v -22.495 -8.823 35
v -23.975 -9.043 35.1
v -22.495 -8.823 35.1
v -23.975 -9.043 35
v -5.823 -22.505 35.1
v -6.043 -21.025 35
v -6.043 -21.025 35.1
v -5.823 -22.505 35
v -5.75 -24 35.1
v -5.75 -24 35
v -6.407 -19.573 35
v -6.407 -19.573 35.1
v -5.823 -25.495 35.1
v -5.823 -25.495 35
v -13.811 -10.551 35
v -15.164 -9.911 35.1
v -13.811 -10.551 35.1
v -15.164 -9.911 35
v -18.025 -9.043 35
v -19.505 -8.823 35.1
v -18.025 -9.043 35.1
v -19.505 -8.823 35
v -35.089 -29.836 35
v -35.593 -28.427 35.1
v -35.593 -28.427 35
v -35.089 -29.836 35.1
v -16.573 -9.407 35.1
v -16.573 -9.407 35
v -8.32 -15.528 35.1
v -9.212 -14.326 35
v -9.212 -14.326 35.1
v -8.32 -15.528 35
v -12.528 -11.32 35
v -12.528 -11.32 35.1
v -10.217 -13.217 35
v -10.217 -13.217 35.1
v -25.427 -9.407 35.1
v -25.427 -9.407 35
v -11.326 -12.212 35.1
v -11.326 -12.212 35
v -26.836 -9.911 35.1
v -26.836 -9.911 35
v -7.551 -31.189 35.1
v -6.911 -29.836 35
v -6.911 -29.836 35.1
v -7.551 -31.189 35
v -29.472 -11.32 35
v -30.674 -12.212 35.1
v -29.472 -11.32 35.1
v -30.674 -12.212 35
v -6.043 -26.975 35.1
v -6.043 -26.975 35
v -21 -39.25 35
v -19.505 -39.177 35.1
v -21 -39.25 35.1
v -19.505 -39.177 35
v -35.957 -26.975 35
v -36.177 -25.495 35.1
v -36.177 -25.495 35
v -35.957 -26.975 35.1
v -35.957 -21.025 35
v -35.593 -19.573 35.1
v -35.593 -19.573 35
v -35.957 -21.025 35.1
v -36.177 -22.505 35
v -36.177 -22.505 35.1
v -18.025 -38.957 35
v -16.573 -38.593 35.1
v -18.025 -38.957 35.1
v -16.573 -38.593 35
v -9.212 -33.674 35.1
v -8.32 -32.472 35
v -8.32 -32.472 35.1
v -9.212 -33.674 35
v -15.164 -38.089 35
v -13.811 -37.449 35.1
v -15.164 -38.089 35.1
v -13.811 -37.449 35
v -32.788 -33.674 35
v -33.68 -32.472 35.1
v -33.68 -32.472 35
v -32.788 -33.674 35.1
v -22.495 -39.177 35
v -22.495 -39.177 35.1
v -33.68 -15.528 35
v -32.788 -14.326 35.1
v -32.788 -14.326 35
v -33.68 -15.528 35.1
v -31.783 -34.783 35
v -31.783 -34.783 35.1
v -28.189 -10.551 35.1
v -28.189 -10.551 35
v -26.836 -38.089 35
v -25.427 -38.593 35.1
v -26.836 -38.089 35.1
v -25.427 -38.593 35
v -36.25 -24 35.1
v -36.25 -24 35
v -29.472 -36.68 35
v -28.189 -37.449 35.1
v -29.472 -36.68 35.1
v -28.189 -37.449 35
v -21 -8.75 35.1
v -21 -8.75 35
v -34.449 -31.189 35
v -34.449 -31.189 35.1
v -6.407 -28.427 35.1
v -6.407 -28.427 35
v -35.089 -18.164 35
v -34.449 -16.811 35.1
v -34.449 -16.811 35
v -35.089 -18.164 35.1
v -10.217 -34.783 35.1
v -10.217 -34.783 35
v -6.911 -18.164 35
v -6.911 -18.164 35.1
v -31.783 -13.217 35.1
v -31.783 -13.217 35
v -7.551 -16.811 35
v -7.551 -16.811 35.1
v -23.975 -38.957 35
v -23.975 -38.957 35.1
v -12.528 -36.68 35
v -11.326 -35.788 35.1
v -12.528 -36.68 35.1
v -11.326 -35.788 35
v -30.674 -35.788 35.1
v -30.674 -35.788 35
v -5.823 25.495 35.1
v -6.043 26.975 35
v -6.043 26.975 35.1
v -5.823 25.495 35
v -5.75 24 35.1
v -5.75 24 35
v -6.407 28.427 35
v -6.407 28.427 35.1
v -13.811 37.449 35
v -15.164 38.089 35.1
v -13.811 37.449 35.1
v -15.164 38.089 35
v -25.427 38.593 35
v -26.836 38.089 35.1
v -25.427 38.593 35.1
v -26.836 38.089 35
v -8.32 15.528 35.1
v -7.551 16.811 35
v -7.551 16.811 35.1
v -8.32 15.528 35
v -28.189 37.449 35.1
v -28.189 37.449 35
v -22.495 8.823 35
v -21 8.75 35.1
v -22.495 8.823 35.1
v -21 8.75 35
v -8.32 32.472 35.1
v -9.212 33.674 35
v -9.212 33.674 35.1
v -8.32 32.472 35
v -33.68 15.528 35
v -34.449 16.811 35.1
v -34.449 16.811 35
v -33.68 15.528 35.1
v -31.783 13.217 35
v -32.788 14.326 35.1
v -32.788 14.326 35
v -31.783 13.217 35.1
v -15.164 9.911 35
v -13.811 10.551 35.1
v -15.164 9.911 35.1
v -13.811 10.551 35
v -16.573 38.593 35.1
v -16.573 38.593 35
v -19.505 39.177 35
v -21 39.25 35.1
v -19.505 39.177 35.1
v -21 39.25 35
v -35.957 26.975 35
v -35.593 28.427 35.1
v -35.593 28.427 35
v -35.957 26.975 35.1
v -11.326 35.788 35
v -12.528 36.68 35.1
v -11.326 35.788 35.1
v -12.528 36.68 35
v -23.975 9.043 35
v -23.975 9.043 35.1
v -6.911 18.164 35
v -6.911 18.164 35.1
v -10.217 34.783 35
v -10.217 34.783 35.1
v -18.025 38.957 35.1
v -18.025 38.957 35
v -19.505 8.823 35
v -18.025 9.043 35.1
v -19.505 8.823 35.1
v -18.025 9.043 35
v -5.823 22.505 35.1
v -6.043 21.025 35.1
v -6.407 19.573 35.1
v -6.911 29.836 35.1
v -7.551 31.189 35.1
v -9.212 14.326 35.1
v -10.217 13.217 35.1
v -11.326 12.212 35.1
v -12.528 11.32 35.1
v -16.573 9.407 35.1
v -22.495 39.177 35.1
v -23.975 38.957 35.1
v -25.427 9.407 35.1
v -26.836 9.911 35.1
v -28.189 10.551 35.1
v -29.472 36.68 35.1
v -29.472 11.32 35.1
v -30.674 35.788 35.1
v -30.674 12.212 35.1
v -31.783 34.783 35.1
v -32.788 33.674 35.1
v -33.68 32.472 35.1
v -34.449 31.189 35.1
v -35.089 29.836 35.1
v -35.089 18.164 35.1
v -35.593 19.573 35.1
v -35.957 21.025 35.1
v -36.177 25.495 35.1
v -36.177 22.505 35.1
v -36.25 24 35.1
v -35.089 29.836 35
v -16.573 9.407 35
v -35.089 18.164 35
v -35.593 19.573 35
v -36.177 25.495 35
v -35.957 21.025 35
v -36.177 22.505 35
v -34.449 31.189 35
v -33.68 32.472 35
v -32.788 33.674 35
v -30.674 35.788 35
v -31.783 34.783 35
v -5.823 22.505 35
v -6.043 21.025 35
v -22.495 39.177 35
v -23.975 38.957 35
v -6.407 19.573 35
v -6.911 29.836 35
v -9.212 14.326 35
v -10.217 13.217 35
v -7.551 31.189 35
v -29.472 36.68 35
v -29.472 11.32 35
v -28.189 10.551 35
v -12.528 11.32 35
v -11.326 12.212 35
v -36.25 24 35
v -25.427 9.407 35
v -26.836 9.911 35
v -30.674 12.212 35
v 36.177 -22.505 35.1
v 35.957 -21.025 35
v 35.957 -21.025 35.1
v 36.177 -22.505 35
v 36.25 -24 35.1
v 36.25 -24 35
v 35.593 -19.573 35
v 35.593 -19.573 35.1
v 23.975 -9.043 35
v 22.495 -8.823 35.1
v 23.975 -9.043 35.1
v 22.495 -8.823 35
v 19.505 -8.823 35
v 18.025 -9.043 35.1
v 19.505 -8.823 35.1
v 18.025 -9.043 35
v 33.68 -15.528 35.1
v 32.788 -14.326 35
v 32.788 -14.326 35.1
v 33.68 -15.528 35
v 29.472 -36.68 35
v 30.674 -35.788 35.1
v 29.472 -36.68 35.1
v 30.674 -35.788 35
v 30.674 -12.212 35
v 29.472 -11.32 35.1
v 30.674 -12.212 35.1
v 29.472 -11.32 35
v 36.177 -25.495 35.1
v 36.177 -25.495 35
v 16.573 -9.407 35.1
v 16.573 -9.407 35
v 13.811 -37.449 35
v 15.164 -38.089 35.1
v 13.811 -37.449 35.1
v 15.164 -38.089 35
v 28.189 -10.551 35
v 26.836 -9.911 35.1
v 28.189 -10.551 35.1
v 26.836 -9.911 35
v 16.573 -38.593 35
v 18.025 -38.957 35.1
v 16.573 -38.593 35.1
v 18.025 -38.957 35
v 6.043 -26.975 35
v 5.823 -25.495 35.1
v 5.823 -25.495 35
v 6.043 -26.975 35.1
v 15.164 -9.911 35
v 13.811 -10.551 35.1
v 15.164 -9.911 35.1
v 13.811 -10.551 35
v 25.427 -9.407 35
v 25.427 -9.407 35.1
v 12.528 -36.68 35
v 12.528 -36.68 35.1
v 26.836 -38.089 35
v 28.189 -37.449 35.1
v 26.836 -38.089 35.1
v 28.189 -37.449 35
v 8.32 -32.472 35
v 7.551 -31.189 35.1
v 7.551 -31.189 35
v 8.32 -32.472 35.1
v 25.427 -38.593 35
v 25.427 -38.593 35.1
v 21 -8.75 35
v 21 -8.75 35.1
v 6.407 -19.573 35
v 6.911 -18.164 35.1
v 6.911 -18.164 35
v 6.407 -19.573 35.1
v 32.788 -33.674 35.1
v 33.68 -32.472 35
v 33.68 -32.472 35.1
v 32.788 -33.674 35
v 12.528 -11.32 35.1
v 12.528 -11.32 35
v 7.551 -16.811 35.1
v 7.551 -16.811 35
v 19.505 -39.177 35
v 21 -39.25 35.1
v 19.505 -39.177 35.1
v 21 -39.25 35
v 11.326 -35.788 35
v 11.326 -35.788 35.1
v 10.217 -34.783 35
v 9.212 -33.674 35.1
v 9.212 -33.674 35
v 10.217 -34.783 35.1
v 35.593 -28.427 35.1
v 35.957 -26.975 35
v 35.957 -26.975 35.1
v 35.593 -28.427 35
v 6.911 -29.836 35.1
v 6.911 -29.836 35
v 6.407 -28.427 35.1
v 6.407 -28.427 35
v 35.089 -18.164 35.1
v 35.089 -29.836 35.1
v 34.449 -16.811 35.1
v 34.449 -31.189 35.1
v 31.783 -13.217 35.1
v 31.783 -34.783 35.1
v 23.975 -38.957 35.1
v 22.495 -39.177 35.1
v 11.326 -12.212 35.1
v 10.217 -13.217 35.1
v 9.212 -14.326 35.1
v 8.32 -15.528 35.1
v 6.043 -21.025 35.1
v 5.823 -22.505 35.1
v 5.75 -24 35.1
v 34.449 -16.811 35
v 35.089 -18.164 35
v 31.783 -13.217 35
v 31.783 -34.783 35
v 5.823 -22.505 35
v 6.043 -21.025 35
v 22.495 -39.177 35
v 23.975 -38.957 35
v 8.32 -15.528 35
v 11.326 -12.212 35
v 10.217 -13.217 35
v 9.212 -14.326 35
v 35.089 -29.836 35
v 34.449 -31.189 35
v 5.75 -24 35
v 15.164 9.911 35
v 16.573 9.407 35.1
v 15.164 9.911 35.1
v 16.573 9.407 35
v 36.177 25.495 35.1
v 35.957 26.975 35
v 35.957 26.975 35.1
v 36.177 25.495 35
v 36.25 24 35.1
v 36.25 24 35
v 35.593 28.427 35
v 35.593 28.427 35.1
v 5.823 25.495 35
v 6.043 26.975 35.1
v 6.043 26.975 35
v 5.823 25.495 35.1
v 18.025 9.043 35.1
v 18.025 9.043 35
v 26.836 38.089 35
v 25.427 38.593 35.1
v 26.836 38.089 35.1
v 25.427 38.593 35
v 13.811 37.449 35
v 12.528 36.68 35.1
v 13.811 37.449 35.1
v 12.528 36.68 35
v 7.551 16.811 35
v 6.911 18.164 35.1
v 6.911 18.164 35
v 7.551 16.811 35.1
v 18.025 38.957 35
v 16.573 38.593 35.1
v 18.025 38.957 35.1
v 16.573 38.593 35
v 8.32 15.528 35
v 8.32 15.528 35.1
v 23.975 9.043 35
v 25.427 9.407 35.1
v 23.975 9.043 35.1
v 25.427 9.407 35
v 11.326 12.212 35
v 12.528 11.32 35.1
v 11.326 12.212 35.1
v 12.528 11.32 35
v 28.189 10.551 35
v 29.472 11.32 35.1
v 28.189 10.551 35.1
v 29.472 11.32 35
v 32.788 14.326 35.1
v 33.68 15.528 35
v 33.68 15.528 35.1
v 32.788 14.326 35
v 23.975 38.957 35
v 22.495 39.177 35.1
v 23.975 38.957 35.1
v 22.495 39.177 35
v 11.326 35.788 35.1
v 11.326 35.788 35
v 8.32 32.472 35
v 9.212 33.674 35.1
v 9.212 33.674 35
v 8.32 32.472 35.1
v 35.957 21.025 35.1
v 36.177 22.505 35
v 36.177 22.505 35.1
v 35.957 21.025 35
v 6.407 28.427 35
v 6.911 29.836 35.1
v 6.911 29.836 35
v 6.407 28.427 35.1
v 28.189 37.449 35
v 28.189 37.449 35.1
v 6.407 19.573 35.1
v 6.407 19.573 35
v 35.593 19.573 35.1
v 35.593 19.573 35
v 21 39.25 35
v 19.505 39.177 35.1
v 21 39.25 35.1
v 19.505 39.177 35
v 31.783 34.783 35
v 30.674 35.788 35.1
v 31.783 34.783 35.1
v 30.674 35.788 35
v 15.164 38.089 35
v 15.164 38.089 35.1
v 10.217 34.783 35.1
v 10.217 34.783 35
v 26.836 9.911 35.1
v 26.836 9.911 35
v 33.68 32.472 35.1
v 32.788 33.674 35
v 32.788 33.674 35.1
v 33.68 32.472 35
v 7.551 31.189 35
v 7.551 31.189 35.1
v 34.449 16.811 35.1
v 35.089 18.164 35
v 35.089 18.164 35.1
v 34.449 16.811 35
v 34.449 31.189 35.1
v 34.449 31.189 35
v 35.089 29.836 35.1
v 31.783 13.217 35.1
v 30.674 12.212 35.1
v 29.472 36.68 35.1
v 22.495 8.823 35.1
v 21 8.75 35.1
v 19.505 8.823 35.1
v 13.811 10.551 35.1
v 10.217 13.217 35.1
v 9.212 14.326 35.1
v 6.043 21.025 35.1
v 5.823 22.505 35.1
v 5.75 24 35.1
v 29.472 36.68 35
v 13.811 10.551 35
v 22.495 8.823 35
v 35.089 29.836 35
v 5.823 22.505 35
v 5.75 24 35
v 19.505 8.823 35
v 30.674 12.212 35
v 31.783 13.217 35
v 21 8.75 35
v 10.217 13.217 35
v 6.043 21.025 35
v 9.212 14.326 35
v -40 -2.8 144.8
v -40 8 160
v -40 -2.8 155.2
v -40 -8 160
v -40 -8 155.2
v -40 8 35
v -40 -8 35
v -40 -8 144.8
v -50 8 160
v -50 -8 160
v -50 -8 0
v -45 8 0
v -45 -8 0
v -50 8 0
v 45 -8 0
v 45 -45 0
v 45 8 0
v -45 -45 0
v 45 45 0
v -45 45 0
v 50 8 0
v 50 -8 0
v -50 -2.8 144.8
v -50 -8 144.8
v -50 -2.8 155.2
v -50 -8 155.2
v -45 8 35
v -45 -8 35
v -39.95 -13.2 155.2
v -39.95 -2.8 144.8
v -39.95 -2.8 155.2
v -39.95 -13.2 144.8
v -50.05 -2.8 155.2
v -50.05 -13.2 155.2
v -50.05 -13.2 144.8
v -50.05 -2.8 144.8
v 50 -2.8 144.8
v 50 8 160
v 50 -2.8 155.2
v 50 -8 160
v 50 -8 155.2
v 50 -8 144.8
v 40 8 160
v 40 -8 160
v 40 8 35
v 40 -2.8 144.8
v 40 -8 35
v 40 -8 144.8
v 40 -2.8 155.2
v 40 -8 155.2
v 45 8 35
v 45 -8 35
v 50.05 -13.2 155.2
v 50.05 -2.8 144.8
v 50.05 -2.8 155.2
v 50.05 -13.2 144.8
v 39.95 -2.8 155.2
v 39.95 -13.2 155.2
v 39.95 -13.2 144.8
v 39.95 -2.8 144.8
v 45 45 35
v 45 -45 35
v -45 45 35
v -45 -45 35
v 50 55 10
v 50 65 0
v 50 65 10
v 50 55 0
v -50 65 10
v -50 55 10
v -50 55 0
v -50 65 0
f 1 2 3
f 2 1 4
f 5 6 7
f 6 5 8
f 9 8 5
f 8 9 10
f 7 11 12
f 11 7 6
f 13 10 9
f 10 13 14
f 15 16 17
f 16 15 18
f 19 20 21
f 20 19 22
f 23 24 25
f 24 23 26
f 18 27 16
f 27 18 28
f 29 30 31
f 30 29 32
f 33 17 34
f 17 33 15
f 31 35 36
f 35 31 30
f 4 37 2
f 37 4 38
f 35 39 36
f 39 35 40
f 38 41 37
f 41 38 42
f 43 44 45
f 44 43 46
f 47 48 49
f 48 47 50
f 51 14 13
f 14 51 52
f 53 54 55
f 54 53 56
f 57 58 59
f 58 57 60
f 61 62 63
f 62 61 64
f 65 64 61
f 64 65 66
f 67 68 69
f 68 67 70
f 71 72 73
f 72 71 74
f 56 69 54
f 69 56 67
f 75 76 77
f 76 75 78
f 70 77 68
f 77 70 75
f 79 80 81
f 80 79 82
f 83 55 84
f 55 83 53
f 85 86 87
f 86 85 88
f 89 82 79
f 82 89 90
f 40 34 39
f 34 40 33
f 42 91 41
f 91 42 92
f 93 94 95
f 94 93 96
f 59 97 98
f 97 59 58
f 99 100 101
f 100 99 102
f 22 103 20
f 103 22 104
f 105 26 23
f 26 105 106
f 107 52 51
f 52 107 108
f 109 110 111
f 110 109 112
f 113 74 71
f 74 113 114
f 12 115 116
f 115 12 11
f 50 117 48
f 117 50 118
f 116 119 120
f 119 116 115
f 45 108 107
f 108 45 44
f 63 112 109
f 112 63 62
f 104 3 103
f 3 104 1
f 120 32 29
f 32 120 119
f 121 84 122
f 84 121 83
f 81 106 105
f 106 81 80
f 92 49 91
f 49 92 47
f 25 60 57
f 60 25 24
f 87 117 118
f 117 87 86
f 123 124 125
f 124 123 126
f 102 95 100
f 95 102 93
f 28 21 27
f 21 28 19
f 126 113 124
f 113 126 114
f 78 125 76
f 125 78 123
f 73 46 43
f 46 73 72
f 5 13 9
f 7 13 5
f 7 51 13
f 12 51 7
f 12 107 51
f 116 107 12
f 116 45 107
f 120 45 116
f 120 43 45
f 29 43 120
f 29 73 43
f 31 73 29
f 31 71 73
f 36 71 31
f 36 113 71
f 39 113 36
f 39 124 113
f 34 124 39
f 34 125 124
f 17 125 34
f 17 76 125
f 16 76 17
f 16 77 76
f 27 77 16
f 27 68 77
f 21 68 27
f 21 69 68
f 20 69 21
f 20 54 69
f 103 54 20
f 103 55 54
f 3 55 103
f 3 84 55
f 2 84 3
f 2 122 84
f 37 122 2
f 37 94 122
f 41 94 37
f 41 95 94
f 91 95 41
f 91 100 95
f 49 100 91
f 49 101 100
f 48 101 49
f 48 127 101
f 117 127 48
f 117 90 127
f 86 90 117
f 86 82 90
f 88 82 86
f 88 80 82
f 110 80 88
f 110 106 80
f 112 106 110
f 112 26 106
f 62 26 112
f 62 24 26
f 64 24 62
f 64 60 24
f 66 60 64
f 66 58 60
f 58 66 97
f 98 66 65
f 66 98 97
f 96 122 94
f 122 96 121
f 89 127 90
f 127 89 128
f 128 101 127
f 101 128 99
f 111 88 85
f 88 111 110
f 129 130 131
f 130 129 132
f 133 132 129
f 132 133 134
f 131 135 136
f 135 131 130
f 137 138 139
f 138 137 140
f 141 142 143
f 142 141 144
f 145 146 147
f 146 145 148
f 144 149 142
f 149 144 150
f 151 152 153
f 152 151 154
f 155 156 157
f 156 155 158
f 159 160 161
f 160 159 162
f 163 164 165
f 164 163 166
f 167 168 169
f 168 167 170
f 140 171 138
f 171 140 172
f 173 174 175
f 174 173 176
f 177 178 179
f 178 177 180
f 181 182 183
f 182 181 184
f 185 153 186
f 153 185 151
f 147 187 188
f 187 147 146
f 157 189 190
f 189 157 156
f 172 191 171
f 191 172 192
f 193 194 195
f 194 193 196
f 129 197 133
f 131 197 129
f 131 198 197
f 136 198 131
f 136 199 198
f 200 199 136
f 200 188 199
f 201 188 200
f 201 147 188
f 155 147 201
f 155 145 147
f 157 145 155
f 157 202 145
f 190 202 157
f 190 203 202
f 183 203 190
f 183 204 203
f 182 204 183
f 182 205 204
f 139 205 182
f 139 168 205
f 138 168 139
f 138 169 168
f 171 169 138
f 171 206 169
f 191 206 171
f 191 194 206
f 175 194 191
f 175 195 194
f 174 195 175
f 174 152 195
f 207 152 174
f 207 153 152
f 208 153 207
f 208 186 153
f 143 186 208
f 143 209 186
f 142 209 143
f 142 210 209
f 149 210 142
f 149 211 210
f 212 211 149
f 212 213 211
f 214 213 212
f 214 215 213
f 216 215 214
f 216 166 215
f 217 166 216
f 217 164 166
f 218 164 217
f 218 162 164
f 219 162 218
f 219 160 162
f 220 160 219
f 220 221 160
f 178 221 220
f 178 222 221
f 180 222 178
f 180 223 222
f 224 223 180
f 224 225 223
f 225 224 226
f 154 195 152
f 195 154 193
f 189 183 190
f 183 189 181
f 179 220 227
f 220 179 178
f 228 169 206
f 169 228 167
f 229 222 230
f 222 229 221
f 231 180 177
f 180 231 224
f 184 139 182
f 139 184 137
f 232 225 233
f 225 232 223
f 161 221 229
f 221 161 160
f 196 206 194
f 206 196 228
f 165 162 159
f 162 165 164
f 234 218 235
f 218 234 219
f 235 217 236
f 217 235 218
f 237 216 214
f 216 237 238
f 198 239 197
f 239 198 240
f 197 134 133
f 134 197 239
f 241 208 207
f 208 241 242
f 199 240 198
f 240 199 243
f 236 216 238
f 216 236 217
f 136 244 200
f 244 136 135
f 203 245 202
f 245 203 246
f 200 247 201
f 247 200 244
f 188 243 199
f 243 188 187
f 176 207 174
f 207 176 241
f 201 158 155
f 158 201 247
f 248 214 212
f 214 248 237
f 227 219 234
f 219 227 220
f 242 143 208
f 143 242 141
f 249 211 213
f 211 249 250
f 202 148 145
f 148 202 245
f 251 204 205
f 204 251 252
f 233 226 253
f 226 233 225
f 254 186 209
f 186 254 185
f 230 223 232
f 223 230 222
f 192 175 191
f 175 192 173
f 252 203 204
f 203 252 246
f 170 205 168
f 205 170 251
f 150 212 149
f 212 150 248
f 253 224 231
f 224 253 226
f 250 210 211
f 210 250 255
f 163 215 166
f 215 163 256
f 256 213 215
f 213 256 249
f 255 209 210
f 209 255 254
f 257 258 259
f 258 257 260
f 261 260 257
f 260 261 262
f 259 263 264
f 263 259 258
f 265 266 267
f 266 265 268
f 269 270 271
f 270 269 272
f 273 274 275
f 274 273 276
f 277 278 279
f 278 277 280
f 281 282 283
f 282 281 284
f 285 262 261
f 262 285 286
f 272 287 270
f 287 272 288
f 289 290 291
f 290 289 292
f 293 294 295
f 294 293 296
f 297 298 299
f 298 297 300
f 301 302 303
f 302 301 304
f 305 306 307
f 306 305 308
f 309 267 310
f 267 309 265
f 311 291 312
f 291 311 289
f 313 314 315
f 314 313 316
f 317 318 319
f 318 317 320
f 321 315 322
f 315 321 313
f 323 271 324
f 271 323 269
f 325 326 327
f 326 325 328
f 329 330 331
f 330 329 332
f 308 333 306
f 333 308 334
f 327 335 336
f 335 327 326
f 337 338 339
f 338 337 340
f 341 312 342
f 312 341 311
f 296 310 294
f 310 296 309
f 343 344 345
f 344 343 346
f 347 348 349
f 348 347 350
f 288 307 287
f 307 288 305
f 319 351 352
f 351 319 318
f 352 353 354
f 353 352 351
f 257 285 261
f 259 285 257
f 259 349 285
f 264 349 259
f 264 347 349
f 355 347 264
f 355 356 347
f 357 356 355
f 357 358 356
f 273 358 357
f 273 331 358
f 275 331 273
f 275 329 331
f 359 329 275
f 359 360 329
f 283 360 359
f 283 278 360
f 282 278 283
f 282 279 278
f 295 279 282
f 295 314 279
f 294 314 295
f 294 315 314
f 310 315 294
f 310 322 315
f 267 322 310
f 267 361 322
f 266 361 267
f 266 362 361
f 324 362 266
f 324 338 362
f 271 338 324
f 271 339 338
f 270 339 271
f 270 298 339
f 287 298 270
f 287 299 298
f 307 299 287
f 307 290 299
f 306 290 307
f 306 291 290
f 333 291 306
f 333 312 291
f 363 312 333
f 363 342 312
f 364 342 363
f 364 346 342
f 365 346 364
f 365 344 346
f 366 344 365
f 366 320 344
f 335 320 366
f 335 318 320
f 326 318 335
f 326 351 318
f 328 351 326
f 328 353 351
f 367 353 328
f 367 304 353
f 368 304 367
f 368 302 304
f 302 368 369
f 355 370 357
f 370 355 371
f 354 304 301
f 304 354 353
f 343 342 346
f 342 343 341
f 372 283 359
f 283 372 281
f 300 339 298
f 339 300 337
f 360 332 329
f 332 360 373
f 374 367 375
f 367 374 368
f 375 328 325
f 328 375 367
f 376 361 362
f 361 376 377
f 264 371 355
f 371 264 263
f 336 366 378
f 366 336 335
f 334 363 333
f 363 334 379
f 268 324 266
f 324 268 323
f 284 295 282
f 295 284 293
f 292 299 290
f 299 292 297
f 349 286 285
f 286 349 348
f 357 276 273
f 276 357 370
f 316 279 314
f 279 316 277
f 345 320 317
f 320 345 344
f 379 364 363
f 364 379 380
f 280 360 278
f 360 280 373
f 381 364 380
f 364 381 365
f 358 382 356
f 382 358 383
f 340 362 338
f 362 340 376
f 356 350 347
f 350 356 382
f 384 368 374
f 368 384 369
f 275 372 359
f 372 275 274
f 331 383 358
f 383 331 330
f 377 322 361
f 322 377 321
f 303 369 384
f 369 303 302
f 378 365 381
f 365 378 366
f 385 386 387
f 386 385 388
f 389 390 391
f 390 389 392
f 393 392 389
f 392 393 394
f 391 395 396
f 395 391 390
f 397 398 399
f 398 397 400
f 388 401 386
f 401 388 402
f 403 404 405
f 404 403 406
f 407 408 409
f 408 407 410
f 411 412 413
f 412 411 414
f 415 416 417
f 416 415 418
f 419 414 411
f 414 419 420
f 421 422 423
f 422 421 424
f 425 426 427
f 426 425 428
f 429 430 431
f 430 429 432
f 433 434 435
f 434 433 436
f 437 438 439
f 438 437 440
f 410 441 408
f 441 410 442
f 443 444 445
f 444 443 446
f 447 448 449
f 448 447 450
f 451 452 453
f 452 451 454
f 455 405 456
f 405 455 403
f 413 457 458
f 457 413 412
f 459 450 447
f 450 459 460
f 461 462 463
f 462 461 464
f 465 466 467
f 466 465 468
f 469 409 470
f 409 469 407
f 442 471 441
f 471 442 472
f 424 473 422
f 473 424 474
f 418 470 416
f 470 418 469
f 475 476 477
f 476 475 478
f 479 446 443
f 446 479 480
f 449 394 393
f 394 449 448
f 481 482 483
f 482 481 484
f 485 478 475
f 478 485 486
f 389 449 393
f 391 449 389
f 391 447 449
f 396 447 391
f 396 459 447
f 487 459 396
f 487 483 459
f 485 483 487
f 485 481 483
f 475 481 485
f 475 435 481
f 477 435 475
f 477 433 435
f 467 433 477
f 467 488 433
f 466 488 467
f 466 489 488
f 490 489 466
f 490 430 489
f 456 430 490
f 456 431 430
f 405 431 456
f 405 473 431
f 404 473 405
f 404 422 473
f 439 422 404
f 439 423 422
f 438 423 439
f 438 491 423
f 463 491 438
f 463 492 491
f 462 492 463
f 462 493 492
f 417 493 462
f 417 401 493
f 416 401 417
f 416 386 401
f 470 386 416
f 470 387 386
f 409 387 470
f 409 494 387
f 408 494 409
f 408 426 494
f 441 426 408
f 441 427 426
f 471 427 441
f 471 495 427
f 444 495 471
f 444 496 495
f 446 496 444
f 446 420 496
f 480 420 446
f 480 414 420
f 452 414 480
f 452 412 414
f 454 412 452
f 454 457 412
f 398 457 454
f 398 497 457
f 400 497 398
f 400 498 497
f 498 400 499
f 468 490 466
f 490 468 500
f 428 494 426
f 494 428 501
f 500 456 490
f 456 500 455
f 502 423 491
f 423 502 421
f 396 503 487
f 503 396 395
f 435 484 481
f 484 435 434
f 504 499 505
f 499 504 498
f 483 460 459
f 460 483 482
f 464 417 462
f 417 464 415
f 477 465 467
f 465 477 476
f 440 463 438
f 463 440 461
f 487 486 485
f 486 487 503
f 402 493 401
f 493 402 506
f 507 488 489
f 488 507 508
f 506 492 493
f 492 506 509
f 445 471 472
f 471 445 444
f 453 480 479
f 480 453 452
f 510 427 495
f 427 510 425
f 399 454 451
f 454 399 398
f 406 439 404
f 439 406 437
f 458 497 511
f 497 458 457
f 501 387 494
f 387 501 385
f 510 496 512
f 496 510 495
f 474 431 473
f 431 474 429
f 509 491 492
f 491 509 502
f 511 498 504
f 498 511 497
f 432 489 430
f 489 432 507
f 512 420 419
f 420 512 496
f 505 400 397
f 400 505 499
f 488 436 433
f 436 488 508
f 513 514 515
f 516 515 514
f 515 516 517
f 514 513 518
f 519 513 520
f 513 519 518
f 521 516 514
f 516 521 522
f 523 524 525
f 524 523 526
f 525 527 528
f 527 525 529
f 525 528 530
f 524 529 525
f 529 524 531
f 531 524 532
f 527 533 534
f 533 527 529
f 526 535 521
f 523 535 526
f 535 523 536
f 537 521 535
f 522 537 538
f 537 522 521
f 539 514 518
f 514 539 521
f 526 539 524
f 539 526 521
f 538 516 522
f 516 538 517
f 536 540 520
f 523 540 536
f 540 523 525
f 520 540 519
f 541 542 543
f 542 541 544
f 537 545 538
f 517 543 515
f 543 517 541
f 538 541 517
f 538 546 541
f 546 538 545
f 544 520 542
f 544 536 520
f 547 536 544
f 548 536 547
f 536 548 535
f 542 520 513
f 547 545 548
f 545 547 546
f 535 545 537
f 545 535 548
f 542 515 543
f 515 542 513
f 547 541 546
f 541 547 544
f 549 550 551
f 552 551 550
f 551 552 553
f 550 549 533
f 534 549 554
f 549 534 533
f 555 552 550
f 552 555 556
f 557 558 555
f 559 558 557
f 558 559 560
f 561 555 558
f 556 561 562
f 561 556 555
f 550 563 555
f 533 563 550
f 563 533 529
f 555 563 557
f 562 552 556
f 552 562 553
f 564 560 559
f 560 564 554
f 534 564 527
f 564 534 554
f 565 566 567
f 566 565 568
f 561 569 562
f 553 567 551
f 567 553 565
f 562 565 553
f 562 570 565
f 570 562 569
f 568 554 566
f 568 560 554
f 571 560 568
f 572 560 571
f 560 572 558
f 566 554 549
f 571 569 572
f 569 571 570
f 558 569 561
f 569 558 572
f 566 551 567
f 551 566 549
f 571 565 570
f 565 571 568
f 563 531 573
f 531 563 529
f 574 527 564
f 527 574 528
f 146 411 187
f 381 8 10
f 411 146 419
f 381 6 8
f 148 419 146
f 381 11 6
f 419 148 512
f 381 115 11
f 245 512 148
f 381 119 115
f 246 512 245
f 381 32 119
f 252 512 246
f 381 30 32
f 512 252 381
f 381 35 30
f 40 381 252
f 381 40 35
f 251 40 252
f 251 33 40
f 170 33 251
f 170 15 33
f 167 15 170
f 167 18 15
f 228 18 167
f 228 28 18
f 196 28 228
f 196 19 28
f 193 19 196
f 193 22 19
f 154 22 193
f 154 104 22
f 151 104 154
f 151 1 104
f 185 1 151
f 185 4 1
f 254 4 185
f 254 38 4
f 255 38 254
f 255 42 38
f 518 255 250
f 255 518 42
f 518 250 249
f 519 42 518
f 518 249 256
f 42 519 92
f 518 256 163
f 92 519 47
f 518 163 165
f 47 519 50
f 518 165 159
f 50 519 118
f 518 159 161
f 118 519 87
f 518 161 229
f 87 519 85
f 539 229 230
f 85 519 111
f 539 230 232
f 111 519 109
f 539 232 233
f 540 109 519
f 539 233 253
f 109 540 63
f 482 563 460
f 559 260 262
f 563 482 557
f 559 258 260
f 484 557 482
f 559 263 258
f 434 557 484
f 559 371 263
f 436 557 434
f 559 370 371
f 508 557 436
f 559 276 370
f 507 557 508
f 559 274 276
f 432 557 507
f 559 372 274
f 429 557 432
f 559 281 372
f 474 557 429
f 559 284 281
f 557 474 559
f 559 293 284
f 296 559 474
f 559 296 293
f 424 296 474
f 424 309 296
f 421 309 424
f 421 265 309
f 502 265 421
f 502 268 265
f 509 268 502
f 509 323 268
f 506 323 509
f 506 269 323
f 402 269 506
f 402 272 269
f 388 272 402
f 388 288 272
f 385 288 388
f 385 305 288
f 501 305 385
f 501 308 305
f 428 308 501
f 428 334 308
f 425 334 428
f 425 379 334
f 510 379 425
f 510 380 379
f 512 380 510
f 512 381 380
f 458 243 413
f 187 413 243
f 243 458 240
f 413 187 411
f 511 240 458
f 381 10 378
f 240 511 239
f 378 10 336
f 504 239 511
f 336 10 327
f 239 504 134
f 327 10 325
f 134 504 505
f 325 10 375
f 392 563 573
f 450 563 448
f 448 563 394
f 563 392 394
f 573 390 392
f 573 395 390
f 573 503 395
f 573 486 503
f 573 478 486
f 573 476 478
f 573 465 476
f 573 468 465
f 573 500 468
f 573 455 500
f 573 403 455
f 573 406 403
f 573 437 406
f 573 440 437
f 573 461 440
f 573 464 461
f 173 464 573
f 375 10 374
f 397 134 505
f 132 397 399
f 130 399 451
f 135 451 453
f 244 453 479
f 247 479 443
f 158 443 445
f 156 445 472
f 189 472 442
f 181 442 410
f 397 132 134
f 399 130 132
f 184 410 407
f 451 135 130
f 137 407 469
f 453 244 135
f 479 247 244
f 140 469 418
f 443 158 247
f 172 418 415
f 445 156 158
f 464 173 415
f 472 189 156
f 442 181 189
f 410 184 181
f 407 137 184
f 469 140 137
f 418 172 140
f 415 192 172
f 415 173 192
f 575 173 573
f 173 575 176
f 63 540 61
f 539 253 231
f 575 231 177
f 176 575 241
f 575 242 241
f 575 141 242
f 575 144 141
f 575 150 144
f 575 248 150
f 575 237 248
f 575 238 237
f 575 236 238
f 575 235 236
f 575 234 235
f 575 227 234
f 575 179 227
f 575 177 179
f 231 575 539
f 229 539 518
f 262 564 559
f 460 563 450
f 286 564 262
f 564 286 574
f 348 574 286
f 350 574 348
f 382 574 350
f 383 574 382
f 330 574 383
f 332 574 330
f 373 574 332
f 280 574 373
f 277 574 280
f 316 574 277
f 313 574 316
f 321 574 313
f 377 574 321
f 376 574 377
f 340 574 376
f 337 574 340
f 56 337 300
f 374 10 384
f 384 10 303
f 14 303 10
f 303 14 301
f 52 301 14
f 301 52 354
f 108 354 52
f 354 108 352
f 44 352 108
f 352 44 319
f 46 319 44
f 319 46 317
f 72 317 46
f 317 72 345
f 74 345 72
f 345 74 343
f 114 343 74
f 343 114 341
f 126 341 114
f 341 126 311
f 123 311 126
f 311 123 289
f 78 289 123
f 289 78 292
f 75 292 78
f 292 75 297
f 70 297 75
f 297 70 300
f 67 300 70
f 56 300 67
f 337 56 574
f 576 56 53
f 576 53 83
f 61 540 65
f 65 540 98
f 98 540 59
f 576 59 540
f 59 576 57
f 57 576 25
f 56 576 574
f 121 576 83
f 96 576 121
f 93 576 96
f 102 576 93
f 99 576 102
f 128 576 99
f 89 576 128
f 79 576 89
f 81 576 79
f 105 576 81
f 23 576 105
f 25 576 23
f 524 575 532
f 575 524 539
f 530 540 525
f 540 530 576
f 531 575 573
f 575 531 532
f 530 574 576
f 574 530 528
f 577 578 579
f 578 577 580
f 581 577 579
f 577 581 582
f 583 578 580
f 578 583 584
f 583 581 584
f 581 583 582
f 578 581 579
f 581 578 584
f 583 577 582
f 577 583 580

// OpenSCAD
// Dimensions for Part 1: Base Block
base_x = 90;
base_y = 90;
base_z = 35;

// Dimensions for Part 1: Tube Seats
seat_diameter = 30.5;
seat_depth = 30;
seat_floor = 5; // base_z - seat_depth
seat_x_pos = 21;
seat_y_pos = 24;

// Dimensions for Part 1: Posts
post_x = 10;
post_y = 16;
post_z = 160;
post_hole_size = 10.4;
post_hole_z = 150;

// Dimensions for Part 2: Handle
handle_x = 100;
handle_y = 10;
handle_z = 10;
handle_y_start = 55;
handle_y_end = 65;

// Global settings
$fn = 64;

// Part 1: Base Block with Seats and Posts
// Centered on origin as requested.
translate([0, 0, 0]) {
    // Base Block
    translate([-base_x/2, -base_y/2, 0]) {
        cube([base_x, base_y, base_z], center = false);
    }
    
    // Tube Seats (Blind Holes)
    for (sx = [-seat_x_pos, seat_x_pos]) {
        for (sy = [-seat_y_pos, seat_y_pos]) {
            translate([sx, sy, seat_floor]) {
                cylinder(r = seat_diameter/2, h = seat_depth + 0.1, center = false); // +0.1 to ensure cut goes through
            }
        }
    }
    
    // Posts
    // Left Post: Flush with end face (-base_x/2), centred on y=0
    translate([-base_x/2 - post_x/2, -post_y/2, 0]) {
        cube([post_x, post_y, post_z], center = false);
        // Hole in Left Post: Square 10.4x10.4 through X, centred at z=150
        // The hole goes through the X dimension.
        translate([post_x/2, 0, post_hole_z]) {
            cube([post_x + 0.1, post_hole_size, post_hole_size], center = true); // +0.1 to ensure cut goes through
        }
    }
    
    // Right Post: Flush with end face (+base_x/2), centred on y=0
    translate([base_x/2 - post_x/2, -post_y/2, 0]) {
        cube([post_x, post_y, post_z], center = false);
        // Hole in Right Post
        translate([post_x/2, 0, post_hole_z]) {
            cube([post_x + 0.1, post_hole_size, post_hole_size], center = true); // +0.1 to ensure cut goes through
        }
    }
}

// Part 2: Handle
// Lying on the bed along X, centred on x=0.
// Spans y = 55 to 65.
// 10mm gap to base's +Y face (base is 90mm wide, so +Y face is at y=45. 55-45=10mm gap).
translate([0, (handle_y_start + handle_y_end)/2, handle_z/2]) { // Center handle in Y and Z
    translate([-handle_x/2, -handle_y/2, -handle_z/2]) {
        cube([handle_x, handle_y, handle_z], center = false);
    }
}
